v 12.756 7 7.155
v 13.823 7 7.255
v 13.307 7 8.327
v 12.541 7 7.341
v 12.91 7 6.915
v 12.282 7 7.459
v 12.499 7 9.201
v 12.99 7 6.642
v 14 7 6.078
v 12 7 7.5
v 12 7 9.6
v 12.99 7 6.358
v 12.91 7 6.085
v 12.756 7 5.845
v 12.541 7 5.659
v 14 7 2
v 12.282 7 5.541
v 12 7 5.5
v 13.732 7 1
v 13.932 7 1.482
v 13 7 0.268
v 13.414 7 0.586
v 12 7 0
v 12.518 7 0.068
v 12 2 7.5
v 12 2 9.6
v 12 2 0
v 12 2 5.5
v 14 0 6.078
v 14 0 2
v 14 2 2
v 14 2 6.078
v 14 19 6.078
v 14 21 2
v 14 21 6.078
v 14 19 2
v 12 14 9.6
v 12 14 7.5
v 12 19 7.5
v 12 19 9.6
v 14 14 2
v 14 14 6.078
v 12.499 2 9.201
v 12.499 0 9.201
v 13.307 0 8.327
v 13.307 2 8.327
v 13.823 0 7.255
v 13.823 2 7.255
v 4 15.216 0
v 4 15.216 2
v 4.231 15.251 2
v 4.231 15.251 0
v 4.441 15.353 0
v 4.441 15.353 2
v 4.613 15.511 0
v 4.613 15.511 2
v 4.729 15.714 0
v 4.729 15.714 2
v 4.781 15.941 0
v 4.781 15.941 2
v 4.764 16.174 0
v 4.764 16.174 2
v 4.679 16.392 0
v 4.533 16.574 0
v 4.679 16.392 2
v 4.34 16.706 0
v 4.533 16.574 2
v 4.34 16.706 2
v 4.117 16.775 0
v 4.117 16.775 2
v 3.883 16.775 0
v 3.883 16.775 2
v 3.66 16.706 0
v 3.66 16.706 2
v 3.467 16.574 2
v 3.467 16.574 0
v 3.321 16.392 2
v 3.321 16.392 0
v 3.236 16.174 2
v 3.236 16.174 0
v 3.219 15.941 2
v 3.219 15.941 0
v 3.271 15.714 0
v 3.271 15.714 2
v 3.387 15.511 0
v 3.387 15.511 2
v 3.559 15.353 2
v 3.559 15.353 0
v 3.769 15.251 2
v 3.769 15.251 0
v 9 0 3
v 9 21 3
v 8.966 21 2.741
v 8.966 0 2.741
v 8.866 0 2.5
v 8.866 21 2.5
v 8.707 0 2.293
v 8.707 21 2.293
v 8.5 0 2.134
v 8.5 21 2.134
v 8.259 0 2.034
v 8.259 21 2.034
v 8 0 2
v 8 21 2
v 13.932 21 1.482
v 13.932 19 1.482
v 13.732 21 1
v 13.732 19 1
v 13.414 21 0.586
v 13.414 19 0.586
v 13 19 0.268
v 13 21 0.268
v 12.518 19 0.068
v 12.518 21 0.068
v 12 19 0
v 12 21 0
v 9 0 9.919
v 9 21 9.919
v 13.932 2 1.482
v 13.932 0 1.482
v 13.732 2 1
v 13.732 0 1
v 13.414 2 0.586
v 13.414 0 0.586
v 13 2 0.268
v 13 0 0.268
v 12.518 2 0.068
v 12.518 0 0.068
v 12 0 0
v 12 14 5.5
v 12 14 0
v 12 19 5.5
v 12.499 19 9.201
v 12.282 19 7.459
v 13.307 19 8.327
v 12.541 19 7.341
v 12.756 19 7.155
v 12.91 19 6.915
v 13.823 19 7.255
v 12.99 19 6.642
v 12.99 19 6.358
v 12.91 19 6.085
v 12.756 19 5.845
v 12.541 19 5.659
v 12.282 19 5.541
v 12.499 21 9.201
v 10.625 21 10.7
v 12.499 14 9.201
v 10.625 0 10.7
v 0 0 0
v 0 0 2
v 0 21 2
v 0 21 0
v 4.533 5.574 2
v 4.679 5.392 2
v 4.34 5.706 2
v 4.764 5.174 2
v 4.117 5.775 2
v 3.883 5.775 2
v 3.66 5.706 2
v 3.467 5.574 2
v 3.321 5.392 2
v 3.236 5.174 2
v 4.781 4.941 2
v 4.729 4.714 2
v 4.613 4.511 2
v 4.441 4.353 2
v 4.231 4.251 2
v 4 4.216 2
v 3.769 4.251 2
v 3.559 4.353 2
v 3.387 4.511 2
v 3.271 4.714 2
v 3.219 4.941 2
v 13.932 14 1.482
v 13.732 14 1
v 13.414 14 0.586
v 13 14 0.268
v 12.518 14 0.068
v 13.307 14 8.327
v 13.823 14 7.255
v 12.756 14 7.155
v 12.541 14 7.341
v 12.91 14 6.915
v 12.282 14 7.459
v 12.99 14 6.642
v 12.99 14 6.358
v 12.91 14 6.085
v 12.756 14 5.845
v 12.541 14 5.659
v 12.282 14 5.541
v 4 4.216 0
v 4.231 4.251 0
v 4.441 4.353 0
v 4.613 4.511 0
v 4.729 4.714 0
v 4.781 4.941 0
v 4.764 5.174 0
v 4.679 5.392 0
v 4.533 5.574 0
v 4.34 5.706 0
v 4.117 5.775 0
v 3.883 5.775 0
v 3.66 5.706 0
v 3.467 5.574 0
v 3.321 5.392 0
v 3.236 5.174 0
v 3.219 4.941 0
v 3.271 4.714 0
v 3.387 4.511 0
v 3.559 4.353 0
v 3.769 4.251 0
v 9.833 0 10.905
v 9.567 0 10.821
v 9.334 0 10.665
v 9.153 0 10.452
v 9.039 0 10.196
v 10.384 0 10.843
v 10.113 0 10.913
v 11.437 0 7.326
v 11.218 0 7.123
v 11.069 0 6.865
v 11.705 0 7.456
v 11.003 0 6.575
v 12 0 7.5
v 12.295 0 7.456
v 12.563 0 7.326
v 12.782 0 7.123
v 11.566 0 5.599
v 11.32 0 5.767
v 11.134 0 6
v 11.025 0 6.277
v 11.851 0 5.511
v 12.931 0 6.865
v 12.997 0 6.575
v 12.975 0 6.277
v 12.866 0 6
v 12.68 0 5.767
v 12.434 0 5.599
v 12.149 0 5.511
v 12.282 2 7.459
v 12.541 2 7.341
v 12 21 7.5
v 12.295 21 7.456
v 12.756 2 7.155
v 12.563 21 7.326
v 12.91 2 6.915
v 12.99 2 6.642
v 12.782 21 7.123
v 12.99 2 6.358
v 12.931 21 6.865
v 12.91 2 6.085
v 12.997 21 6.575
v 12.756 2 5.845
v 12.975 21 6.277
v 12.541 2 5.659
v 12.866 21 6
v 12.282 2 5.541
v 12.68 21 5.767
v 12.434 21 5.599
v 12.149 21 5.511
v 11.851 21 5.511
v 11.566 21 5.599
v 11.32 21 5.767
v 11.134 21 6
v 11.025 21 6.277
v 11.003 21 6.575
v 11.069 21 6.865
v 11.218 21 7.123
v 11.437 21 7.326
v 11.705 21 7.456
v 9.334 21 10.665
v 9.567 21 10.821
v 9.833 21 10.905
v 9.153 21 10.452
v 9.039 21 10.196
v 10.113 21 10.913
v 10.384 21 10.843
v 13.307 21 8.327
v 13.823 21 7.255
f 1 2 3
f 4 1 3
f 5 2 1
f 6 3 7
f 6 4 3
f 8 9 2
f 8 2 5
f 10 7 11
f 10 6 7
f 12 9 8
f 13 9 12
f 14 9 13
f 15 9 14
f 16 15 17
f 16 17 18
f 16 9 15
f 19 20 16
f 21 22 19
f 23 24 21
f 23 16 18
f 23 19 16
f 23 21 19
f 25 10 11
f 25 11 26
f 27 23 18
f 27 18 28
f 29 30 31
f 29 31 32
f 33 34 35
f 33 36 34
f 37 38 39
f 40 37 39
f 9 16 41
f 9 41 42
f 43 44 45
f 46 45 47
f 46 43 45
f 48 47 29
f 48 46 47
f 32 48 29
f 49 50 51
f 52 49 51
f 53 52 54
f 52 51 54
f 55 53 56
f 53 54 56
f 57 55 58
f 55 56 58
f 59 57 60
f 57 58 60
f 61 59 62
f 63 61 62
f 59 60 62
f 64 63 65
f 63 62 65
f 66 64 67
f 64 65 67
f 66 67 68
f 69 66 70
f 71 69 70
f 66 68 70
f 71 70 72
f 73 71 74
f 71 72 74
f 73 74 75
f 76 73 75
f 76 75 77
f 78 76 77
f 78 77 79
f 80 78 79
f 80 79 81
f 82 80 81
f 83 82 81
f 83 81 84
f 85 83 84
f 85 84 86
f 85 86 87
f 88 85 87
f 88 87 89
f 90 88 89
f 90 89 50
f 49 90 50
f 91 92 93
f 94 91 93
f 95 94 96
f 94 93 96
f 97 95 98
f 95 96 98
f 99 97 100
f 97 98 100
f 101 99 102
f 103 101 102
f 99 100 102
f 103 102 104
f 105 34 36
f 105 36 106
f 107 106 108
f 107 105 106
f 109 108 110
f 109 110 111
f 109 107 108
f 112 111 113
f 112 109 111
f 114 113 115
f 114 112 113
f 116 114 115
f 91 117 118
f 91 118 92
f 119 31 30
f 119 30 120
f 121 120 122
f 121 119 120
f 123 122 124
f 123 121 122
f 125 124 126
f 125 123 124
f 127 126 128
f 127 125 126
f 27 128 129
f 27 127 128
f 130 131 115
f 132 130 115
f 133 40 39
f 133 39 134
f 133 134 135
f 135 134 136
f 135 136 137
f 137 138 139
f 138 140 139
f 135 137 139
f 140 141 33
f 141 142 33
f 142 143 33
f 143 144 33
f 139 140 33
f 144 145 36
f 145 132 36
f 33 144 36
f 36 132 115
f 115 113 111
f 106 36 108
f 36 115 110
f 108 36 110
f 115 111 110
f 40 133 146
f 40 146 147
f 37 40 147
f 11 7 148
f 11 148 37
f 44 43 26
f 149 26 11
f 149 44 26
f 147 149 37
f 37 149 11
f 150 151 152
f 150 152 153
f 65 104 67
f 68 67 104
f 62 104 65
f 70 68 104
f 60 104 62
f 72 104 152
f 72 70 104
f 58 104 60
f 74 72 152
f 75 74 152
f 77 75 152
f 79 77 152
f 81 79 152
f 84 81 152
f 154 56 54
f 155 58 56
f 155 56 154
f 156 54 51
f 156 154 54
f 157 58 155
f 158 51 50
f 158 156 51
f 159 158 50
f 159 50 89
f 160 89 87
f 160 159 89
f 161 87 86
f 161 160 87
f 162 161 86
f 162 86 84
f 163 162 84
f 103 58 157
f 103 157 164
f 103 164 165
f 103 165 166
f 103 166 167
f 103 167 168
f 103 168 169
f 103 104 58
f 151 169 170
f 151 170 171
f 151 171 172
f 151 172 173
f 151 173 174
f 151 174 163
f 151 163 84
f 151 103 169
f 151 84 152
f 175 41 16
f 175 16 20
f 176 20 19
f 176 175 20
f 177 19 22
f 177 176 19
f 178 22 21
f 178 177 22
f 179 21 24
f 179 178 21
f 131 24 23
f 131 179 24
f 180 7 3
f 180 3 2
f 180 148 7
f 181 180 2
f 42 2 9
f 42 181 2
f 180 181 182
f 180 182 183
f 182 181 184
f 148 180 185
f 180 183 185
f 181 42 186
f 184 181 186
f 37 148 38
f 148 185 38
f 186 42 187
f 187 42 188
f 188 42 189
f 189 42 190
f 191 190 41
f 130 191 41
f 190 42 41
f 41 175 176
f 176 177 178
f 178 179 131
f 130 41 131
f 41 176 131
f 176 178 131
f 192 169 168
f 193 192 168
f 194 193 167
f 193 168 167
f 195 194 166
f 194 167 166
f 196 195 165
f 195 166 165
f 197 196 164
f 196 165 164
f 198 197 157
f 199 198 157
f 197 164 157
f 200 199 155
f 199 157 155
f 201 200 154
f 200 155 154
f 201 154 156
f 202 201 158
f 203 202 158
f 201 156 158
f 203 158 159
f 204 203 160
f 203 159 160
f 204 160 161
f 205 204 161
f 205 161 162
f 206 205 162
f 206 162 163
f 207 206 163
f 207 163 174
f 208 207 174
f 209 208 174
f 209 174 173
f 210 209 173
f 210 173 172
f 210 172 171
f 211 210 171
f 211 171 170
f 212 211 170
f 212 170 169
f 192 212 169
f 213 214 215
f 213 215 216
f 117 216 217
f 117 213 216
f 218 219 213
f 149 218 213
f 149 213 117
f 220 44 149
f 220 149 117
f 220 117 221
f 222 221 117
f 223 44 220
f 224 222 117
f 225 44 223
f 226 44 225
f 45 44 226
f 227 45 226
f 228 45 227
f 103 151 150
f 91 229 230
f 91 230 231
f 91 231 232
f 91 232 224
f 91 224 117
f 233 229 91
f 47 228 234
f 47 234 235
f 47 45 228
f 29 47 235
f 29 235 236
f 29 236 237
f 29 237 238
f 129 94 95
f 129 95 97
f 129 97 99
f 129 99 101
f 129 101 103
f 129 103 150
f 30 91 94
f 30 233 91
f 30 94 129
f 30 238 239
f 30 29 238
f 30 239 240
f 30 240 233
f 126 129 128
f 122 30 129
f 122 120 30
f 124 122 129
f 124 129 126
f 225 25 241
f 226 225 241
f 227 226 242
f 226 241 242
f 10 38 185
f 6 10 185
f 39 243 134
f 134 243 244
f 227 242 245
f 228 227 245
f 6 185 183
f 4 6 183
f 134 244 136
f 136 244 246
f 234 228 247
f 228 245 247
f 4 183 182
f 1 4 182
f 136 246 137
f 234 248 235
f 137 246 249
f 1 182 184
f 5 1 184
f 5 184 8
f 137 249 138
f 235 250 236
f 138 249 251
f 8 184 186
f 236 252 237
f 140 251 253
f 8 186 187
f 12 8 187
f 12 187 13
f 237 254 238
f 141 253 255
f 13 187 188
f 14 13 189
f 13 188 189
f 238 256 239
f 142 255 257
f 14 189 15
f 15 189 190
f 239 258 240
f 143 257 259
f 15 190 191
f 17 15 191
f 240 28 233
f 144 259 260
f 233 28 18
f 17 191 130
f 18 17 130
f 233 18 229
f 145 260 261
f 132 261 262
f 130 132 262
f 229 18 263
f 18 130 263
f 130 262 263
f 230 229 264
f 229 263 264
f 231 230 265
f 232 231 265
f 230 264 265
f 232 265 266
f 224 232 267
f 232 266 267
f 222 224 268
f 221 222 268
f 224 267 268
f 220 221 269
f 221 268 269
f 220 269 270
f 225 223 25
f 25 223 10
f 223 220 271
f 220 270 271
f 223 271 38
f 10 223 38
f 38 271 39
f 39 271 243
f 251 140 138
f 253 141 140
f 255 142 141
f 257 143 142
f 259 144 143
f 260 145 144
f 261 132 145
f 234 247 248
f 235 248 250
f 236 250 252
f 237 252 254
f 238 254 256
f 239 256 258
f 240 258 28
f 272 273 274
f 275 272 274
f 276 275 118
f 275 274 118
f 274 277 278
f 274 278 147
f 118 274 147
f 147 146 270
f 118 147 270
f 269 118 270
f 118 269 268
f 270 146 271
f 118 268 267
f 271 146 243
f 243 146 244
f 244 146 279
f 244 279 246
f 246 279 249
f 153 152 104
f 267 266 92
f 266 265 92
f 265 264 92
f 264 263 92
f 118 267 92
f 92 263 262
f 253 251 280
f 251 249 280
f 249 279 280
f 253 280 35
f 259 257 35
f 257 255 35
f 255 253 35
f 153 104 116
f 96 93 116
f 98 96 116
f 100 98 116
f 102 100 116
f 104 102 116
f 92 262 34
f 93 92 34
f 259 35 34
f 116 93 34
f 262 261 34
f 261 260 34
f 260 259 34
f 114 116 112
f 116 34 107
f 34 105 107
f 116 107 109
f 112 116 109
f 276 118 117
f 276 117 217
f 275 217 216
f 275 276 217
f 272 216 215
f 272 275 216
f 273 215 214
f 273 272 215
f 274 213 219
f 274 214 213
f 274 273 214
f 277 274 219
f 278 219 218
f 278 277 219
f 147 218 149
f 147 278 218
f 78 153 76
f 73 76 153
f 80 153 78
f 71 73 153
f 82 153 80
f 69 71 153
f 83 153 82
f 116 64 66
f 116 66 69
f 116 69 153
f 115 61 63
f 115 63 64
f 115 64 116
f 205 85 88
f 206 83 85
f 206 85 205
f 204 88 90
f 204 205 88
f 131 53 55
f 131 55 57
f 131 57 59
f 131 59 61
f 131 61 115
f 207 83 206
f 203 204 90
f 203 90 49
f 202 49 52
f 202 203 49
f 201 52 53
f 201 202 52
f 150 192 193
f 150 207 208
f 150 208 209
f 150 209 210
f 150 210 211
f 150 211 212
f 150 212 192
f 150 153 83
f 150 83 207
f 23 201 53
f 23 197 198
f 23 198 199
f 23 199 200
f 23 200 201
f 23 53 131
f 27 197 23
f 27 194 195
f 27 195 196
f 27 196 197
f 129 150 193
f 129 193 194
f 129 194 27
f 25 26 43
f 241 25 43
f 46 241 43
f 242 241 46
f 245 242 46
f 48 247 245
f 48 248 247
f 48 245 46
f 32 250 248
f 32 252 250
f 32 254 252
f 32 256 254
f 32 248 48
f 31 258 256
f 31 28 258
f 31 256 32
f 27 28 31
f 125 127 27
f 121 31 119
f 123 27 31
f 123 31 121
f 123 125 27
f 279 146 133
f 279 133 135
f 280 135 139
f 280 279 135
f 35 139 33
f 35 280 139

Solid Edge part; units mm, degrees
sketch "Sketch1" plane through (0, 0, 0) normal (0, -1, 0) x (1, 0, 0)
  line L0 (0, 0) -> (14, 0)
  line L1 (14, 0) -> (14, 8)
  line L2 (14, 8) -> (9, 12)
  line L3 (9, 12) -> (9, 2)
  line L4 (9, 2) -> (0, 2)
  line L5 (0, 2) -> (0, 0)
  dimension "D1" = 2
  dimension "D2" = 14
  dimension "D3" = 10
  dimension "D4" = 9
  dimension "D5" = 8
extrude "Protrusion1" add sketch "Sketch1" against normal blind 21
fillet "round___body" radius 2 1 edges at (14, 10.5, 0)
fillet "round___body" radius 4 1 edges at (14, 10.5, 8)
fillet "round___body" radius 1 2 edges at (9, 10.5, 12) (9, 10.5, 2)
hole "Hole1" at (4, 5, 2) direction (0, 0, -1) diameter 1.567 end up to next thread major 2 thread length 2
hole "Hole2" at (4, 16, 2) direction (0, 0, -1) diameter 1.567 end up to next thread major 2 thread length 2
sketch "Sketch2" plane through (10.5, 10.5, 0) normal (0, 0, -1) x (0, 1, 0)
  line L0 (-8.5, 1.5) -> (-8.5, 3.5)
  line L1 (-8.5, 3.5) -> (-3.5, 3.5)
  line L2 (-3.5, 3.5) -> (-3.5, 1.5)
  line L3 (-3.5, 1.5) -> (-8.5, 1.5)
  line L4 (3.5, 1.5) -> (8.5, 1.5)
  line L5 (8.5, 1.5) -> (8.5, 3.5)
  line L6 (8.5, 3.5) -> (3.5, 3.5)
  line L7 (3.5, 3.5) -> (3.5, 1.5)
  dimension "D1" = 2
  dimension "D2" = 2
  dimension "D3" = 5
  dimension "D4" = 5
extrude "Cutout1" cut sketch "Sketch2" against normal up to next
hole "Hole___Hinge" at (12, 21, 6.5) direction (0, -1, 0) diameter 2 end through all
properties material "ABS Plastic, high impact"
